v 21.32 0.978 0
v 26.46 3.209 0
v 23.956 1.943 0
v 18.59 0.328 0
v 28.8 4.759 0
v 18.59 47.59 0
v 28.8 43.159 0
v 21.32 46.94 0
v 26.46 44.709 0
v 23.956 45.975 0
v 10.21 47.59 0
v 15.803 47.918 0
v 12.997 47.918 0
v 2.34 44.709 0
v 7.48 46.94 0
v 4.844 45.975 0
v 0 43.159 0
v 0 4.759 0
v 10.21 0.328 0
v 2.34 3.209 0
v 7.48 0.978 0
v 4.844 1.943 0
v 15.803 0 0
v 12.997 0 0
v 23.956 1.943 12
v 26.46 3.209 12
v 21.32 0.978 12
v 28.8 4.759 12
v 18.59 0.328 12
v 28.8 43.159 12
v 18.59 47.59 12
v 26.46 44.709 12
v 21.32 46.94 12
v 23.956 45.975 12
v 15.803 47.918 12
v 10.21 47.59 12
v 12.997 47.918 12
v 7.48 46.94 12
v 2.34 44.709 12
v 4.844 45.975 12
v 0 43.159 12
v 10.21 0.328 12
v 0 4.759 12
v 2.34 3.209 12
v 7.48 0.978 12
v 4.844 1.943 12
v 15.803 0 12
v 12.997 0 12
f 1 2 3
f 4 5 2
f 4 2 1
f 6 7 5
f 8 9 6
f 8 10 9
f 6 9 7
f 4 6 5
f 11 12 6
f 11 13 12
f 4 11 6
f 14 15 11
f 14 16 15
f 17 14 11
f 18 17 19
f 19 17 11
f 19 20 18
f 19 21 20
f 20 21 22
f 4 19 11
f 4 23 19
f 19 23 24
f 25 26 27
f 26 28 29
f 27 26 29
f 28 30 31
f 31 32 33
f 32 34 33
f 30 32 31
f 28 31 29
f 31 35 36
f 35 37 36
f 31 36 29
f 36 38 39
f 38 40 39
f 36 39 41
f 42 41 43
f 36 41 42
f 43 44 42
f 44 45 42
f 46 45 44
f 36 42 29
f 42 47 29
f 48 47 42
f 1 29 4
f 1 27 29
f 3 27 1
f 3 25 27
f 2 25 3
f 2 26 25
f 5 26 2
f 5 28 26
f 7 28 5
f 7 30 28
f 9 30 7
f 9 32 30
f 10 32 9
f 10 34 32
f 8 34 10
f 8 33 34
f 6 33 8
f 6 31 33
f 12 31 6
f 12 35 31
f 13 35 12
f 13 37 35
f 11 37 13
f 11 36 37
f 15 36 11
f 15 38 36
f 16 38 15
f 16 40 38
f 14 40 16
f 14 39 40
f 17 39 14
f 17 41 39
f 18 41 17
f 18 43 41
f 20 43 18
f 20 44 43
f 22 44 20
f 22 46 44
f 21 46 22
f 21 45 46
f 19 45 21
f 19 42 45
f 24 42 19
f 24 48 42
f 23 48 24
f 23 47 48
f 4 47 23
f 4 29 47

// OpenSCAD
$fn = 32;

// ----------------------------------------------------------------------
// Eccentric disc: double_d, 12 mm thick
// ----------------------------------------------------------------------

// --- parameters (mm) ---
profile_height = 12;      // extrusion height
profile_points = 24;      // points of the closed outline

profile = [[28.8, 43.159], [26.46, 44.709], [23.956, 45.975], [21.32, 46.94], [18.59, 47.59], [15.803, 47.918], [12.997, 47.918], [10.21, 47.59], [7.48, 46.94], [4.844, 45.975], [2.34, 44.709], [0, 43.159], [0, 4.759], [2.34, 3.209], [4.844, 1.943], [7.48, 0.978], [10.21, 0.328], [12.997, 0], [15.803, 0], [18.59, 0.328], [21.32, 0.978], [23.956, 1.943], [26.46, 3.209], [28.8, 4.759]];  // single closed polygon, 24 points, counter clockwise

// --- the one profile operation ---
linear_extrude(height = profile_height) polygon(points = profile);
